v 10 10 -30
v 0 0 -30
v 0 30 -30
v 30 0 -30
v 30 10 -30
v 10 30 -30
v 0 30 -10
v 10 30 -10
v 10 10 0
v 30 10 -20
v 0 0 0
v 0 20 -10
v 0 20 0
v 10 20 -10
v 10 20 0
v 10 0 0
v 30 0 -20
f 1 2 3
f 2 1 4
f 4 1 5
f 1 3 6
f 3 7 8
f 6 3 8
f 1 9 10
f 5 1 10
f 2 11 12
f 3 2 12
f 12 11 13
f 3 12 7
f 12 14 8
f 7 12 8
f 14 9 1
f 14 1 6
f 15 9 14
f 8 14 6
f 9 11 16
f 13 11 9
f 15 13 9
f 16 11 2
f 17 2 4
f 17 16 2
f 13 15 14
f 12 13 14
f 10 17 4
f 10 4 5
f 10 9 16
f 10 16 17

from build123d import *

# Parameters (mm, degrees)
SKETCH_1_W           = 30
SKETCH_1_H           = 30
EXTRUDE_1_DEPTH      = 30
SKETCH_34_W          = 20
SKETCH_34_H          = 20
CUT_EXTRUDE_23_DEPTH = 52.961524227
SKETCH_35_W          = 10
SKETCH_35_H          = 10
CUT_EXTRUDE_24_DEPTH = 47.904157598
CUT_EXTRUDE_25_DEPTH = 47.904157598


with BuildPart() as part:
    # 草圖1 → 填料-伸1 (new body)
    with BuildSketch(Plane.XY):
        with Locations((15, 15)):
            Rectangle(SKETCH_1_W, SKETCH_1_H)
    extrude(amount=-EXTRUDE_1_DEPTH)

    # 草圖34 → 除料-伸長23 (cut, through all)
    with BuildSketch(Plane.XY):
        with Locations((20, 20)):
            Rectangle(SKETCH_34_W, SKETCH_34_H)
    extrude(amount=-CUT_EXTRUDE_23_DEPTH, mode=Mode.SUBTRACT)

    # 草圖35 → 除料-伸長24 (cut, through all)
    with BuildSketch(Plane(origin=(10, 0, 0), x_dir=(0, 0, -1), z_dir=(1, 0, 0))):
        with Locations((5, 25)):
            Rectangle(SKETCH_35_W, SKETCH_35_H)
    extrude(amount=-CUT_EXTRUDE_24_DEPTH, mode=Mode.SUBTRACT)

    # 草圖36 → 除料-伸長25 (cut, through all)
    with BuildSketch(Plane(origin=(0, 10, 0), x_dir=(1, 0, 0), z_dir=(0, 1, 0))):
        Polygon((10, 0), (30, 20), (30, 0), align=None)
    extrude(amount=-CUT_EXTRUDE_25_DEPTH, mode=Mode.SUBTRACT)


solid = part.part
